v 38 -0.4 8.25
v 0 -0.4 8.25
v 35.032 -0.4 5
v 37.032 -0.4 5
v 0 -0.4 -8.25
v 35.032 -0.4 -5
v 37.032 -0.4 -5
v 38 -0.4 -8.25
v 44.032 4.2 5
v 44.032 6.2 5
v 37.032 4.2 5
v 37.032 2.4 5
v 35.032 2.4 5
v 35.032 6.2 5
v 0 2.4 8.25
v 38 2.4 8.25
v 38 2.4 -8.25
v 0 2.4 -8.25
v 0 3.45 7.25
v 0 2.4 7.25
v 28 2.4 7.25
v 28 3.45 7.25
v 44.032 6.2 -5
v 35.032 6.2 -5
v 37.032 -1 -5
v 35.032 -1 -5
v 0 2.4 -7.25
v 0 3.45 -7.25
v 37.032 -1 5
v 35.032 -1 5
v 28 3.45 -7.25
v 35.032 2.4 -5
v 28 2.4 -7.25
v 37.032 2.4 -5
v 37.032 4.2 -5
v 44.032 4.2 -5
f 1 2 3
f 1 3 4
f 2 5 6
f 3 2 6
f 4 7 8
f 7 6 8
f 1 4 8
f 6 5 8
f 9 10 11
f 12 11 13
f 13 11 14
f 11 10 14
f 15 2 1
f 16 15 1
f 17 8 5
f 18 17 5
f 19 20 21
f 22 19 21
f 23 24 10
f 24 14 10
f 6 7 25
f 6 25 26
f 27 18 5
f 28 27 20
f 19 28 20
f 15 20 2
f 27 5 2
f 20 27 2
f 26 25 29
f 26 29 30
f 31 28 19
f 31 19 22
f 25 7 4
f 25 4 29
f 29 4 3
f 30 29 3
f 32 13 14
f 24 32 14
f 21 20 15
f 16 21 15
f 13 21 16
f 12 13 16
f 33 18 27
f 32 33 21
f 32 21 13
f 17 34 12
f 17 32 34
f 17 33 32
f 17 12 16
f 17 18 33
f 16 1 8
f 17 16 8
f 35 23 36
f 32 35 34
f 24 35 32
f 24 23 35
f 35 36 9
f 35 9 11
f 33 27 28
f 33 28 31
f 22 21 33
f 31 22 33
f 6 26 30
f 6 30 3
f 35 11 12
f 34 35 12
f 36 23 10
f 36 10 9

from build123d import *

# Parameters (mm, degrees)
BOSS_EXTRUDE1_DEPTH      = 2.4
BOSS_EXTRUDE1_DEPTH_BACK = 0.4
SKETCH1_W                = 28
SKETCH1_H                = 14.5
BOSS_EXTRUDE2_START      = 2.4
SKETCH1_3_W              = 28
SKETCH1_3_H              = 14.5
BOSS_EXTRUDE2_DEPTH      = 1.05
BOSS_EXTRUDE3_DEPTH      = 5


with BuildPart() as part:
    # Sketch1 → Boss-Extrude1 (new, two sides: drawn at the far end of the back side and taken through both)
    with BuildSketch(Plane(origin=(0, 0, 0), x_dir=(1, 0, 0), z_dir=(0, 1, 0)).offset(-BOSS_EXTRUDE1_DEPTH_BACK)):
        Polygon((38, 8.25), (0, 8.25), (0, 7.25), (28, 7.25), (28, -7.25), (0, -7.25), (0, -8.25), (38, -8.25), align=None)
        with Locations((14, 0)):
            Rectangle(SKETCH1_W, SKETCH1_H)
    extrude(amount=BOSS_EXTRUDE1_DEPTH + BOSS_EXTRUDE1_DEPTH_BACK)

    # Sketch1<3> → Boss-Extrude2 (add)
    with BuildSketch(Plane(origin=(0, 0, 0), x_dir=(1, 0, 0), z_dir=(0, 1, 0)).offset(BOSS_EXTRUDE2_START)):
        with Locations((14, 0)):
            Rectangle(SKETCH1_3_W, SKETCH1_3_H)
    extrude(amount=BOSS_EXTRUDE2_DEPTH)

    # Sketch2 → Boss-Extrude3 (add, symmetric)
    with BuildSketch(Plane.XY):
        Polygon((37.032081111, -1), (35.032081111, -1), (35.032081111, 6.2), (44.032081111, 6.2), (44.032081111, 4.2), (37.032081111, 4.2), align=None)
    extrude(amount=BOSS_EXTRUDE3_DEPTH, both=True)


solid = part.part
